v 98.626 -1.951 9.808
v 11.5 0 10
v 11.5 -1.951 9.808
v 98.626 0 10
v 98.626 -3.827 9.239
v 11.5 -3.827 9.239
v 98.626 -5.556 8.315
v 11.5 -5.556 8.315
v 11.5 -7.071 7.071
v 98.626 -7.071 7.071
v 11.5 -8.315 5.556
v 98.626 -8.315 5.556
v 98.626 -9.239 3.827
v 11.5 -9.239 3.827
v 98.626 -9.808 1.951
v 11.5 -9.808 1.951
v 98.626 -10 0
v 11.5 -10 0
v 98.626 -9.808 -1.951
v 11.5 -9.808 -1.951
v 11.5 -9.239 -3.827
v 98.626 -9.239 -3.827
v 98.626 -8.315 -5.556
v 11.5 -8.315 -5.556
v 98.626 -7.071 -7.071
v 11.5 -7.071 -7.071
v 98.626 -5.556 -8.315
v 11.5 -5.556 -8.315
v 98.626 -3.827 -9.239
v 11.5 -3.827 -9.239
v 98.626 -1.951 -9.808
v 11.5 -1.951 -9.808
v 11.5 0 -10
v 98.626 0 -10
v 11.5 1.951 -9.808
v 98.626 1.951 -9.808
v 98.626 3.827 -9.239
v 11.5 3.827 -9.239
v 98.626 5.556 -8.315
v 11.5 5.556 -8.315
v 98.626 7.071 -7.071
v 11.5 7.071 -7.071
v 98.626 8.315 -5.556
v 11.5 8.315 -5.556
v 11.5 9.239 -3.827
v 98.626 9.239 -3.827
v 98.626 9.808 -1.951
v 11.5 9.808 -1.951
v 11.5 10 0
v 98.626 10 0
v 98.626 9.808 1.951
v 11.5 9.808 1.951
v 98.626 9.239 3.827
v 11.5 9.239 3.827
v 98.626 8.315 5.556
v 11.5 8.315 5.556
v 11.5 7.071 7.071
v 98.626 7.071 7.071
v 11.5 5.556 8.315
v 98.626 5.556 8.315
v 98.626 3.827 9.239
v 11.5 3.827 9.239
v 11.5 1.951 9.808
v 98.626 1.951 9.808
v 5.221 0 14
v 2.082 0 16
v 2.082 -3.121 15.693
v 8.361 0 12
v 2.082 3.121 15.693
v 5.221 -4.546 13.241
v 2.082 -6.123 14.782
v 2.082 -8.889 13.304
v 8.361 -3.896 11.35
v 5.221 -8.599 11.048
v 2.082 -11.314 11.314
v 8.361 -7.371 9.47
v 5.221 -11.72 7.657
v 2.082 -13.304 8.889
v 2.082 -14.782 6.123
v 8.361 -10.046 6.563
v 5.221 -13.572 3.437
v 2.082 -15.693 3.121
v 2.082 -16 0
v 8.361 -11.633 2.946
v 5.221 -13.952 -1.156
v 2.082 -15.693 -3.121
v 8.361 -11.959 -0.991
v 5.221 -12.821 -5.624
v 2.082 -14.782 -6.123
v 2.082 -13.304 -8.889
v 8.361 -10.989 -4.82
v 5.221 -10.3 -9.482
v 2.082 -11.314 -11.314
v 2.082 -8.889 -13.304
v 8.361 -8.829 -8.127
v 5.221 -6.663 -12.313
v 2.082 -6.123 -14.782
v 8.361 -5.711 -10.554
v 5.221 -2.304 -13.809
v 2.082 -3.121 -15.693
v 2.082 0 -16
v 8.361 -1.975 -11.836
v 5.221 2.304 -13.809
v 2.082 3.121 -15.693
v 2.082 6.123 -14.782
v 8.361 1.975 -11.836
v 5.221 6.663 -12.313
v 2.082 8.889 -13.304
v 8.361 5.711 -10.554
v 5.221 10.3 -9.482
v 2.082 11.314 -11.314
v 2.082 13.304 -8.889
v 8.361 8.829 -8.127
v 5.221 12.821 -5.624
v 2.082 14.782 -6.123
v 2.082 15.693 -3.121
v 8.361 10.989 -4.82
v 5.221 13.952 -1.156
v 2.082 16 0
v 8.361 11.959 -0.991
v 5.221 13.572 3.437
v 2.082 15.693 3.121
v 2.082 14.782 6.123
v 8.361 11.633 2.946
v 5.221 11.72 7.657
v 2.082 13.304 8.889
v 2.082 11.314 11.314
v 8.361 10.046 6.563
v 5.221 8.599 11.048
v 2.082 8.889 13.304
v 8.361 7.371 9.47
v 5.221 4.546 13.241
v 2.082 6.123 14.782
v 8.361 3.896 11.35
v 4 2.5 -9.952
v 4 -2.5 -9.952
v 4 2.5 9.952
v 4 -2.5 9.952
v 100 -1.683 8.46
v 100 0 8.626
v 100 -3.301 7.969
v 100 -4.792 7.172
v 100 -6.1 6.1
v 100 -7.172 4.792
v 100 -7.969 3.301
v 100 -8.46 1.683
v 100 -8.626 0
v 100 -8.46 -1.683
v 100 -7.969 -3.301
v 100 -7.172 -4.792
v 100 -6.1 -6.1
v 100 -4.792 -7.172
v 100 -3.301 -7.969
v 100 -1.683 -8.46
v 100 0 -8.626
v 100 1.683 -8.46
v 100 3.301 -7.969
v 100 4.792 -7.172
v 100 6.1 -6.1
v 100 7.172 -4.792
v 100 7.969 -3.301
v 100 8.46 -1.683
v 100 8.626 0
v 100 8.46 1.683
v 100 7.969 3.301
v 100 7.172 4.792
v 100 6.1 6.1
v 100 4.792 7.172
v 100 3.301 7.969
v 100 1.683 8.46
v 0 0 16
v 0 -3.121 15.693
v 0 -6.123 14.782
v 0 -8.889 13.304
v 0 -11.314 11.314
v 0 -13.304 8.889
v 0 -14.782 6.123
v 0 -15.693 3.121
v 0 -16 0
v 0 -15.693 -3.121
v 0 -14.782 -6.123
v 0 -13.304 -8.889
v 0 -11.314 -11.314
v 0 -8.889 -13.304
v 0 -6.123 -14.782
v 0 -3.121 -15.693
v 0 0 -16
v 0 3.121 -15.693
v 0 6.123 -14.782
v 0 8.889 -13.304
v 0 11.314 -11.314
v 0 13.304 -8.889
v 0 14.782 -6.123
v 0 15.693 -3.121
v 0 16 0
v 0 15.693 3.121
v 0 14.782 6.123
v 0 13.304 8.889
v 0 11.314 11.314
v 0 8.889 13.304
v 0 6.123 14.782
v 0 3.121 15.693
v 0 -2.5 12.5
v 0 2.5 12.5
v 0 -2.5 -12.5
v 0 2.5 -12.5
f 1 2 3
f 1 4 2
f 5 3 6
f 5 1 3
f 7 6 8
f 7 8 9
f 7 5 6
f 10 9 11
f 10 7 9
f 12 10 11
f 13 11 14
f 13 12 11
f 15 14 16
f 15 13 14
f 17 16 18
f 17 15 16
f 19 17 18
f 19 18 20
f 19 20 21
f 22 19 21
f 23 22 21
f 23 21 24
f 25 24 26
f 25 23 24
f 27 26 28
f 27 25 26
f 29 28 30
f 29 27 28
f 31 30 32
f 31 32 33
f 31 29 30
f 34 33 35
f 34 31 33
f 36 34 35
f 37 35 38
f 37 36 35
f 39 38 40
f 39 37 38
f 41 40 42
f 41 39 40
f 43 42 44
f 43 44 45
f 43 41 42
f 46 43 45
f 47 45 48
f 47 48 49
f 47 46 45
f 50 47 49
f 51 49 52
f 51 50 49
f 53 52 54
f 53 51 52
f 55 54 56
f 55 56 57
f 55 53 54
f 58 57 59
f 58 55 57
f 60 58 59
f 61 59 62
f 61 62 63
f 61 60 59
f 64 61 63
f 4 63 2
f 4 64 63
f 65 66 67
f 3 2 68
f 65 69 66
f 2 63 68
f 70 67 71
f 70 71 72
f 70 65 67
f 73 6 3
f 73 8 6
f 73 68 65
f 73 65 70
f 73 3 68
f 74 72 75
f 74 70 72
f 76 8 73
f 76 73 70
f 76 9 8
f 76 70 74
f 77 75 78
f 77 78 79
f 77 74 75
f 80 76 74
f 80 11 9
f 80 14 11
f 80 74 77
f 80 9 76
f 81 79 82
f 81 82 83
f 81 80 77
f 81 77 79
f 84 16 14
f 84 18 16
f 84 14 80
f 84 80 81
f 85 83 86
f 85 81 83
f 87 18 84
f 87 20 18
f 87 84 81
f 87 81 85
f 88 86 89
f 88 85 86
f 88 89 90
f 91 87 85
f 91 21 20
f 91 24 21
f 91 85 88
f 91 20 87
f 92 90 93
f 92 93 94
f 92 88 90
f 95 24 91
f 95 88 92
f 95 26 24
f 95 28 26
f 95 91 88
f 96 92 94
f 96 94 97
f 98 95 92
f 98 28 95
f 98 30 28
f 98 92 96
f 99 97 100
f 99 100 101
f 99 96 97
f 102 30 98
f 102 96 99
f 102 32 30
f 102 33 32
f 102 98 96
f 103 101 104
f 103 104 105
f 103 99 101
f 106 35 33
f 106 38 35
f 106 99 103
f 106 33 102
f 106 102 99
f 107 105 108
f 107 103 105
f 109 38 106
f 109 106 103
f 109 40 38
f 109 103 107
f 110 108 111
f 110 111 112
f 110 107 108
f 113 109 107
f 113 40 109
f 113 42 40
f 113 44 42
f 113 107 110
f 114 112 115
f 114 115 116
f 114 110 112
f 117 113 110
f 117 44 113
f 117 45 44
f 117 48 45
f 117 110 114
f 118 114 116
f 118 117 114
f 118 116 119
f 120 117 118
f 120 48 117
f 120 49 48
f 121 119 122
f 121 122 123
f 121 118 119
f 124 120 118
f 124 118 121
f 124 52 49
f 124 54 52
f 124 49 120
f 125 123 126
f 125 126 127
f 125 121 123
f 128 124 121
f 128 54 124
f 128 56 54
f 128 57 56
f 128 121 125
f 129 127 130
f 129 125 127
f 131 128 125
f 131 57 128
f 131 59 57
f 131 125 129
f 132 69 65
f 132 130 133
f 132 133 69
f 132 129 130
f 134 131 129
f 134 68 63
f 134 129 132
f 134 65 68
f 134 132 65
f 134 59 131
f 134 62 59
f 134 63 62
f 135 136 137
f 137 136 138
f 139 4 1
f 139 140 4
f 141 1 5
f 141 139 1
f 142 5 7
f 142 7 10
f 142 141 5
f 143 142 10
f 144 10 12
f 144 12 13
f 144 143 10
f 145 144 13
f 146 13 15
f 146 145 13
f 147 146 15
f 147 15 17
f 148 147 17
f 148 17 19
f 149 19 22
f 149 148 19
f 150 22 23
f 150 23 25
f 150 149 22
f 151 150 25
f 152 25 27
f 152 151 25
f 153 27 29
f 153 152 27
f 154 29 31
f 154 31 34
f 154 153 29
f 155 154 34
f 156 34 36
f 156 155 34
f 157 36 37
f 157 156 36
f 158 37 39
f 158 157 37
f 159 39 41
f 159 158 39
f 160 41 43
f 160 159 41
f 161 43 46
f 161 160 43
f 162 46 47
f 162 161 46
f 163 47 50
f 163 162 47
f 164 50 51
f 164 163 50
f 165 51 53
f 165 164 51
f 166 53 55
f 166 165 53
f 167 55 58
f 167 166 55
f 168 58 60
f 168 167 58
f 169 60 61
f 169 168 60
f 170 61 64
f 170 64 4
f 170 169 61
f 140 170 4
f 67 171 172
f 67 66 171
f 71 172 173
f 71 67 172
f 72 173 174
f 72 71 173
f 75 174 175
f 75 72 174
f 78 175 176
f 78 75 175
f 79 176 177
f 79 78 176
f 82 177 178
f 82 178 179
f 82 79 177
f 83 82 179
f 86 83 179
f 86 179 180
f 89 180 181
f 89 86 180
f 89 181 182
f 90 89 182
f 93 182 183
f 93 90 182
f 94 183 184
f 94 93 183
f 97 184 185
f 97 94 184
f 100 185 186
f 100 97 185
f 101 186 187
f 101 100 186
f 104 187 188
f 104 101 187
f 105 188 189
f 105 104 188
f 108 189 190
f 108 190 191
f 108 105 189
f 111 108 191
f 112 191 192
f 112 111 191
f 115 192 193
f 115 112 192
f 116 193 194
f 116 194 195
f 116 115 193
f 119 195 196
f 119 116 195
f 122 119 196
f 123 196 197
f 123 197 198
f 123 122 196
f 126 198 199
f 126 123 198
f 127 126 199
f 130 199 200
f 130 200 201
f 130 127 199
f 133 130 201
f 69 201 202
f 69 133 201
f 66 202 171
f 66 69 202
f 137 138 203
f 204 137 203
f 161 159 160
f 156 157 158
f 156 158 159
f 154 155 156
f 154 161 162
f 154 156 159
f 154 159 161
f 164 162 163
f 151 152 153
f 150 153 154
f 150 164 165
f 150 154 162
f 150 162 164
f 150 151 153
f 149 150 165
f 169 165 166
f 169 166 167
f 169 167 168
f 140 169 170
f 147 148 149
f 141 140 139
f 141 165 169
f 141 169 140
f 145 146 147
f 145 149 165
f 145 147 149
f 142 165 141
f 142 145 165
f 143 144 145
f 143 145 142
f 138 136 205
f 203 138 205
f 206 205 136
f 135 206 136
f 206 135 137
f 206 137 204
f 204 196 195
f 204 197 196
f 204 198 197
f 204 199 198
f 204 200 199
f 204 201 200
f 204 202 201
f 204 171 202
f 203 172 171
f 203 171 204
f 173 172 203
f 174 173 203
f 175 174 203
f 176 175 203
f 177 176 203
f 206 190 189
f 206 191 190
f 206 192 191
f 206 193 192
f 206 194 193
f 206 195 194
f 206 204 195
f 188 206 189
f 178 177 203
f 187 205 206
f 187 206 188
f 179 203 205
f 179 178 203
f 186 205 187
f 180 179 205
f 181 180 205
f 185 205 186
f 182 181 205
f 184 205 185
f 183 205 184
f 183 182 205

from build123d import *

# Parameters (mm, degrees)
SLOT_DEPTH      = 2.5
SLOT_DEPTH_BACK = 2.5


with BuildPart() as part:
    # BodySke → BaseBody (revolve)
    with BuildSketch(Plane.XY):
        Polygon((0, 0), (0, 16), (2.081886537, 16), (11.5, 10), (98.626, 10), (100, 8.626), (100, 0), align=None)
    revolve(axis=Axis((0, 0, 0), (1, 0, 0)))

    # SlotSke → Slot (cut, two sides: drawn at the far end of the back side and taken through both)
    with BuildSketch(Plane(origin=(0, 0, 0), x_dir=(1, 0, 0), z_dir=(0, 1, 0)).offset(-SLOT_DEPTH_BACK)):
        Polygon((0, 12.5), (4, 9.951718957), (4, -9.951718957), (0, -12.5), align=None)
    extrude(amount=SLOT_DEPTH + SLOT_DEPTH_BACK, mode=Mode.SUBTRACT)


solid = part.part
